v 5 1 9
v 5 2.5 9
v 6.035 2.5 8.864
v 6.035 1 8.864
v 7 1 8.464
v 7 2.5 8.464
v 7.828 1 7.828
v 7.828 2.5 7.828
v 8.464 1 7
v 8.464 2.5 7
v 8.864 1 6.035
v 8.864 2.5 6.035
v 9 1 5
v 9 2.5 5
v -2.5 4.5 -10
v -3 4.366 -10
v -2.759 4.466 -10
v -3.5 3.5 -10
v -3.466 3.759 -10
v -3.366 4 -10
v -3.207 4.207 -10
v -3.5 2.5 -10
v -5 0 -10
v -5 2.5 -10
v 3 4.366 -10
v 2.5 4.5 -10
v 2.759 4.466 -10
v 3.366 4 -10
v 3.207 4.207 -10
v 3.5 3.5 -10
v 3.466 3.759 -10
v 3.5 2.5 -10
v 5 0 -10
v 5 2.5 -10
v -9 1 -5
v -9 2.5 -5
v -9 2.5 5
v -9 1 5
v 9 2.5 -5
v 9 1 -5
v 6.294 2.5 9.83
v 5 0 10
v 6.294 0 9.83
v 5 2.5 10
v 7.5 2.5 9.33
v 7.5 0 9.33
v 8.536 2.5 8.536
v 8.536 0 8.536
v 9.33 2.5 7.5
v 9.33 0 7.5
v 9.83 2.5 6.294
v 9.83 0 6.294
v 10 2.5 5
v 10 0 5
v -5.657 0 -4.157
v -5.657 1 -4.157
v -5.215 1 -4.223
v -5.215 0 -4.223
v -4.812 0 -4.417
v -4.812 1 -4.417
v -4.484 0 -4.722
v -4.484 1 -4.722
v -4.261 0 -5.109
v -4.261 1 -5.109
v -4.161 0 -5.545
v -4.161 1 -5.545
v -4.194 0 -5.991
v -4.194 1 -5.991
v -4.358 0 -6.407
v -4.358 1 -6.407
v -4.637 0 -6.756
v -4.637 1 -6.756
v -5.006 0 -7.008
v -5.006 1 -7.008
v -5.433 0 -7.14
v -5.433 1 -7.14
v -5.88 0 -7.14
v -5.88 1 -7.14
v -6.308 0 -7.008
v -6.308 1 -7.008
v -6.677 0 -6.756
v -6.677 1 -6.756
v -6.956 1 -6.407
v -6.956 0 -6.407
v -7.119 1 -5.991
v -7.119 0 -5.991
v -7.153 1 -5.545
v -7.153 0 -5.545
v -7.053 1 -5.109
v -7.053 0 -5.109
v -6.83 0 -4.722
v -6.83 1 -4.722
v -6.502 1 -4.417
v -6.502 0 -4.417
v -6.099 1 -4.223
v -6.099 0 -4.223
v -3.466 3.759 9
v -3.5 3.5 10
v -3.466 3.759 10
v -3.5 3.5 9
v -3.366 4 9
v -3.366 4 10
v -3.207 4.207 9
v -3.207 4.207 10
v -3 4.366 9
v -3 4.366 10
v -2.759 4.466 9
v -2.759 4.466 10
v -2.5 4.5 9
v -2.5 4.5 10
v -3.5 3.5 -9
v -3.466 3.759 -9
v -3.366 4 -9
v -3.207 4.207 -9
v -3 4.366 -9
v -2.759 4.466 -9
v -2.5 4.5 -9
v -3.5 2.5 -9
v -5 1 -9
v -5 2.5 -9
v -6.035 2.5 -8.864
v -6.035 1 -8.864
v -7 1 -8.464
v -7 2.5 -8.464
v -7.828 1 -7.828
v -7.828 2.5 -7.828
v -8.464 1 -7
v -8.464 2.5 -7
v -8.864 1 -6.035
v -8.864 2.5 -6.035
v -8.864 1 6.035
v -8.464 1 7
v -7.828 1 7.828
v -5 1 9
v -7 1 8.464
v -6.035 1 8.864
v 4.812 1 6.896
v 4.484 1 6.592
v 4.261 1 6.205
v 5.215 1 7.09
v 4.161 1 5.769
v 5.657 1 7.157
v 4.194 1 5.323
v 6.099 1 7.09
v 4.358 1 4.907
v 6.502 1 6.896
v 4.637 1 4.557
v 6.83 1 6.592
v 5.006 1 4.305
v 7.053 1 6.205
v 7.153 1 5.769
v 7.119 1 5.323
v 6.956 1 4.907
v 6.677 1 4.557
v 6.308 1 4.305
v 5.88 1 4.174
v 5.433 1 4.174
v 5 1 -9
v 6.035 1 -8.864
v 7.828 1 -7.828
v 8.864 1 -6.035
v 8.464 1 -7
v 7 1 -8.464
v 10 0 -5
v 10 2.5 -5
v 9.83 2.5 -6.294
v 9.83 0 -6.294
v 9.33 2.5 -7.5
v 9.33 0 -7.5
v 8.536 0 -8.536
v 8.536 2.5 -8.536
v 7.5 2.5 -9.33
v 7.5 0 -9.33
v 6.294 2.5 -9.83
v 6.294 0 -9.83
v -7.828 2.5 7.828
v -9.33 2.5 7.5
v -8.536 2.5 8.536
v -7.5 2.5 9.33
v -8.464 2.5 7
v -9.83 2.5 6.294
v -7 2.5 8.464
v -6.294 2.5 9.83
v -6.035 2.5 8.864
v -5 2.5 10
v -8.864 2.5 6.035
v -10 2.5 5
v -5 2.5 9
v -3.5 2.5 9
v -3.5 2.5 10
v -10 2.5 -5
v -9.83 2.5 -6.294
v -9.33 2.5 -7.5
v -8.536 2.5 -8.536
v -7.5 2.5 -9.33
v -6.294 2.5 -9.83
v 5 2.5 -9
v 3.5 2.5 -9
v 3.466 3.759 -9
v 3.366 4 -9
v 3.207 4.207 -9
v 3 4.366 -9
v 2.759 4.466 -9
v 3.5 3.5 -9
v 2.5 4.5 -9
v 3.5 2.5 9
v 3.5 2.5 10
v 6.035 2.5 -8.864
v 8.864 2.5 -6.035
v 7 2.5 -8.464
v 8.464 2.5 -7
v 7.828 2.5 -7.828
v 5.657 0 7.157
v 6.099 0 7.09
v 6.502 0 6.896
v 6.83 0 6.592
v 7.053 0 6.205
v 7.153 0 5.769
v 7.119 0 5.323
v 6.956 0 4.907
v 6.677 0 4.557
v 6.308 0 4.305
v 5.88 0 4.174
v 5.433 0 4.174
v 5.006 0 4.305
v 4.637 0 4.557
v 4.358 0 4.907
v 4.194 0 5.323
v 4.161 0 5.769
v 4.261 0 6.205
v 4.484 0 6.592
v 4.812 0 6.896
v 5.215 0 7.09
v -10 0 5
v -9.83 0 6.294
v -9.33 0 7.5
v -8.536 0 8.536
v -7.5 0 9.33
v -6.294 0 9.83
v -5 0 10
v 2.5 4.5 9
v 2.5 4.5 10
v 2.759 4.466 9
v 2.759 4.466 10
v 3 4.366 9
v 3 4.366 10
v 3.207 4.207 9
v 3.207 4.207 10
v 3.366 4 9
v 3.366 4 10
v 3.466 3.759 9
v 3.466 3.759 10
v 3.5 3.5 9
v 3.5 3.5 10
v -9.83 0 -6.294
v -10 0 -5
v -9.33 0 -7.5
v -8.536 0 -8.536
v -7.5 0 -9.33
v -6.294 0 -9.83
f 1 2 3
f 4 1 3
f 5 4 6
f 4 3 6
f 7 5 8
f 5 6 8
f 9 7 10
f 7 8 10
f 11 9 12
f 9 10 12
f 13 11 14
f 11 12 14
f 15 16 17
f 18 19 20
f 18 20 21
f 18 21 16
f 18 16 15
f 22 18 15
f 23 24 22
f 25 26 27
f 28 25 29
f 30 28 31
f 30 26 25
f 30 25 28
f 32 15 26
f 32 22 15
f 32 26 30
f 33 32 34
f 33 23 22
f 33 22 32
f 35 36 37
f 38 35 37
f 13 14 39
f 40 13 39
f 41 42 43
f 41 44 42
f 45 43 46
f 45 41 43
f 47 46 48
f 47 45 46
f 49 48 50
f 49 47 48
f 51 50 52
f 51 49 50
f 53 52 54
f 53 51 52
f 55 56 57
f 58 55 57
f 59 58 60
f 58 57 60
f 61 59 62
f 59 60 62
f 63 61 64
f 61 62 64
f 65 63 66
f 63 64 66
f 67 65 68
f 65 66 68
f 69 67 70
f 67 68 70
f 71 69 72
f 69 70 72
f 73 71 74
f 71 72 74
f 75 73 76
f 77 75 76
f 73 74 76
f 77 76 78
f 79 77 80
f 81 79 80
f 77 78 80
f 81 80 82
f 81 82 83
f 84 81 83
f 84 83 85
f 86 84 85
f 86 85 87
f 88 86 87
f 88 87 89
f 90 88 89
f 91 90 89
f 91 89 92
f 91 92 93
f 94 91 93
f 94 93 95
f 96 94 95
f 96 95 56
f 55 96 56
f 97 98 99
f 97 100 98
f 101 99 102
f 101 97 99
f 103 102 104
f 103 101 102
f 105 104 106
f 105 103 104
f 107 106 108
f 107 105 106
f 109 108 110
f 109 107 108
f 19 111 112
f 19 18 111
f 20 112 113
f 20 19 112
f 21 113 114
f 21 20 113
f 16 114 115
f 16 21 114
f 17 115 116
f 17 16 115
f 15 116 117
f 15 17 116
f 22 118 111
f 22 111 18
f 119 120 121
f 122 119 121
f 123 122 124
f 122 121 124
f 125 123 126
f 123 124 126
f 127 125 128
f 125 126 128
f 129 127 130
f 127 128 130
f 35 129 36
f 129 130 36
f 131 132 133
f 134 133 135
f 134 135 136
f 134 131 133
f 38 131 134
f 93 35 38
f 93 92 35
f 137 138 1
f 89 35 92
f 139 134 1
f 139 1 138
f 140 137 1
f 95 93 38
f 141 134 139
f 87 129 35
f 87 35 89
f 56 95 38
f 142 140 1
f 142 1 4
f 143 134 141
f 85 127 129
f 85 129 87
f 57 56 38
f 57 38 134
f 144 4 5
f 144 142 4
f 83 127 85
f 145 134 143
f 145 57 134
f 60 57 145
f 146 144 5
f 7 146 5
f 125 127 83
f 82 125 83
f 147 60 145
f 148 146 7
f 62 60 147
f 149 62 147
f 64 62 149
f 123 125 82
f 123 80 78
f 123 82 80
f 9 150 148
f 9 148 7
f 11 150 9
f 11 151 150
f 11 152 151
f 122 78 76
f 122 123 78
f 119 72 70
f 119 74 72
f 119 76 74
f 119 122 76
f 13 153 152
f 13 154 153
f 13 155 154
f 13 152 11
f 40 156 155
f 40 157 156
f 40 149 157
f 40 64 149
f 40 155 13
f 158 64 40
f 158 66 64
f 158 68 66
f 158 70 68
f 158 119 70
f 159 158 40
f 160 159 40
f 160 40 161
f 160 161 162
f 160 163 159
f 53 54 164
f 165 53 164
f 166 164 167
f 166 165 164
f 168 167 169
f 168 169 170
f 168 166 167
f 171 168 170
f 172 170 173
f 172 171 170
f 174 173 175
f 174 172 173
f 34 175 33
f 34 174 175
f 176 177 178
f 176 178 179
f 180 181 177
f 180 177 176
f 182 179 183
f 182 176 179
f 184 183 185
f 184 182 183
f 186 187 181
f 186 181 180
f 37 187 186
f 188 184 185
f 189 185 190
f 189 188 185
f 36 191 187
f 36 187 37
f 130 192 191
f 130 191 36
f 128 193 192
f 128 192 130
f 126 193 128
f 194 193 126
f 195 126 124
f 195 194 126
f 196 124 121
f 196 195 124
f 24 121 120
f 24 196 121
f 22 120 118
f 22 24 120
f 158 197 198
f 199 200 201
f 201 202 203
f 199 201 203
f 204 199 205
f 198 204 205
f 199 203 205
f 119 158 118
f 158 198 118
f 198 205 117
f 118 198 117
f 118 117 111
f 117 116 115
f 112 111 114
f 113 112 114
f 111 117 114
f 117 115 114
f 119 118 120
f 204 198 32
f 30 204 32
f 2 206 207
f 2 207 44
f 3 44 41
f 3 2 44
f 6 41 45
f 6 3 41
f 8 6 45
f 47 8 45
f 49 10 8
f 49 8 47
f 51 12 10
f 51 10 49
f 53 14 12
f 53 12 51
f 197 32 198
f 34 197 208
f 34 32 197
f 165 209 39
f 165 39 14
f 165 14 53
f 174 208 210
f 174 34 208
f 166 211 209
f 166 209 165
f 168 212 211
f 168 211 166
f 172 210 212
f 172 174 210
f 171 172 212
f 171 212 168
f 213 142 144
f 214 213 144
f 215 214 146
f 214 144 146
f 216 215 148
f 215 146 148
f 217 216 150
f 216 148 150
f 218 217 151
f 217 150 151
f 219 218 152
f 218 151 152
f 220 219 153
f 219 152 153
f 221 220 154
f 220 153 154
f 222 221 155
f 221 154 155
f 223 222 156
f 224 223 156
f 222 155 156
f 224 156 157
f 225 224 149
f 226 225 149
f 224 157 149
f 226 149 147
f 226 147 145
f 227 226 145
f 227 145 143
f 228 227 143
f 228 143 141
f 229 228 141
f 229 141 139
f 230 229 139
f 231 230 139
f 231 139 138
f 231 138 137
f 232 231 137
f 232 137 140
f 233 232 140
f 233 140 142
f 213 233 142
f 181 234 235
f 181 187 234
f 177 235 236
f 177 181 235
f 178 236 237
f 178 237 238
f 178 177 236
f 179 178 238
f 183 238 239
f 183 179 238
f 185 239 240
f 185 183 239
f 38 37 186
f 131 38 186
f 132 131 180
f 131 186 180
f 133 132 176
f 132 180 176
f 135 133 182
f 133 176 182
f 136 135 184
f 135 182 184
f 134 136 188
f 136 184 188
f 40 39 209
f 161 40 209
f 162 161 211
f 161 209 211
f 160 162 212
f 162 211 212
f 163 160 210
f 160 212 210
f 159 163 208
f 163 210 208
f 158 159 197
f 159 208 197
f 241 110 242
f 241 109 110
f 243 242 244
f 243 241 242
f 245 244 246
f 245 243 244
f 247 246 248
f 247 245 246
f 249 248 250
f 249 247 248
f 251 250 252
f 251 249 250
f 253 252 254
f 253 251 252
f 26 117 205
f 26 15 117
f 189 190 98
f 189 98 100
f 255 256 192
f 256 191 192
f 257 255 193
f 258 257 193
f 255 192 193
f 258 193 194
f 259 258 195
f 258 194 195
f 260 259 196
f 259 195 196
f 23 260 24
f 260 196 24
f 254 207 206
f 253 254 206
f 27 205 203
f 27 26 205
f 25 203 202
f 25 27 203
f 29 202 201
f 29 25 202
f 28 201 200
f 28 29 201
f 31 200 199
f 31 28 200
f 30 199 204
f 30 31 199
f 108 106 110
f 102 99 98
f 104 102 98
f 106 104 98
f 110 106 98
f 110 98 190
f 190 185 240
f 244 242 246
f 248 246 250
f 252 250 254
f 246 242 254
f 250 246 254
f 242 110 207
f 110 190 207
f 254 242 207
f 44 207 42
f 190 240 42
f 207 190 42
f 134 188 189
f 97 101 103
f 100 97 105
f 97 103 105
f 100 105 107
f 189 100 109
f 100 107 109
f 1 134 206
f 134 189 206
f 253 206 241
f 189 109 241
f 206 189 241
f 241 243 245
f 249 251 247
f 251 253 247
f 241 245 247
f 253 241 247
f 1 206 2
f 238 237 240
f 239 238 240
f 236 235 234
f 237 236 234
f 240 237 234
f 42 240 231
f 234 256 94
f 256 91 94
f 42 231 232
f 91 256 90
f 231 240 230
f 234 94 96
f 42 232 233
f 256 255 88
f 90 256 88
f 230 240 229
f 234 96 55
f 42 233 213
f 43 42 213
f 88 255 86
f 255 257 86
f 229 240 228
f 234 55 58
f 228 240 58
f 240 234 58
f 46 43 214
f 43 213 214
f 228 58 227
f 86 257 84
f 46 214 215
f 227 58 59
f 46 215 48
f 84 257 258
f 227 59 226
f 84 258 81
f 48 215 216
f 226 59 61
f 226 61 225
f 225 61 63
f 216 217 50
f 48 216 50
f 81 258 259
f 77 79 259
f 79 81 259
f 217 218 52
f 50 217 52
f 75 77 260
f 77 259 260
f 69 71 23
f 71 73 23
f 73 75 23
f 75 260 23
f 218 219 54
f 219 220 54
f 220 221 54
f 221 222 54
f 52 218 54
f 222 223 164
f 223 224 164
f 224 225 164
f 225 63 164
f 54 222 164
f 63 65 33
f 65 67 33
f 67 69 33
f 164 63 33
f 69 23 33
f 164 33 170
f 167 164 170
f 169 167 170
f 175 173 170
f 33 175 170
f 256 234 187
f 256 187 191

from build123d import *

# Parameters (mm, degrees)
SKETCH1_W           = 20
SKETCH1_H           = 20
BOSS_EXTRUDE1_DEPTH = 2.5
FILLET1_R           = 5
SKETCH2_R           = 1.5
CUT_EXTRUDE1_DEPTH  = 10
CUT_EXTRUDE2_DEPTH  = 1.5
SKETCH4_W           = 7
SKETCH4_H           = 1
BOSS_EXTRUDE2_DEPTH = 2
FILLET2_R           = 1


with BuildPart() as part:
    # Sketch1 → Boss-Extrude1 (new body)
    with BuildSketch(Plane(origin=(0, 0, 0), x_dir=(1, 0, 0), z_dir=(0, 1, 0))):
        Rectangle(SKETCH1_W, SKETCH1_H)
    extrude(amount=BOSS_EXTRUDE1_DEPTH)

    # Fillet1
    fillet1_edges = [part.edges().sort_by_distance(p)[0] for p in [
        (10, 1.25, 10),
        (-10, 1.25, 10),
        (-10, 1.25, -10),
        (10, 1.25, -10),
    ]]
    fillet(fillet1_edges, radius=FILLET1_R)

    # Sketch2 → Cut-Extrude1 (cut)
    with BuildSketch(Plane(origin=(0, 2.5, 0), x_dir=(1, 0, 0), z_dir=(0, 1, 0))):
        with Locations(Location((5.656854249, -5.656854249, 0), (0, 0, 270))):
            Circle(SKETCH2_R)
        with Locations(Location((-5.656854249, 5.656854249, 0), (0, 0, 270))):
            Circle(SKETCH2_R)
    extrude(amount=-CUT_EXTRUDE1_DEPTH, mode=Mode.SUBTRACT)

    # Sketch3 → Cut-Extrude2 (cut)
    with BuildSketch(Plane(origin=(0, 2.5, 0), x_dir=(1, 0, 0), z_dir=(0, 1, 0))):
        with BuildLine():
            Line((5, 9), (-5, 9))
            ThreePointArc((-5, 9), (-7.828427125, 7.828427125), (-9, 5))
            Line((-9, 5), (-9, -5))
            ThreePointArc((-9, -5), (-7.828427125, -7.828427125), (-5, -9))
            Line((-5, -9), (5, -9))
            ThreePointArc((5, -9), (7.828427125, -7.828427125), (9, -5))
            Line((9, -5), (9, 5))
            ThreePointArc((9, 5), (7.828427125, 7.828427125), (5, 9))
        make_face()
    extrude(amount=-CUT_EXTRUDE2_DEPTH, mode=Mode.SUBTRACT)

    # Sketch4 → Boss-Extrude2 (add)
    with BuildSketch(Plane(origin=(0, 2.5, 0), x_dir=(1, 0, 0), z_dir=(0, 1, 0))):
        with Locations((0, 9.5)):
            Rectangle(SKETCH4_W, SKETCH4_H)
        with Locations((0, -9.5)):
            Rectangle(SKETCH4_W, SKETCH4_H)
    extrude(amount=BOSS_EXTRUDE2_DEPTH)

    # Fillet2
    fillet2_edges = [part.edges().sort_by_distance(p)[0] for p in [
        (-3.5, 4.5, -9.5),
        (3.5, 4.5, -9.5),
        (-3.5, 4.5, 9.5),
        (3.5, 4.5, 9.5),
    ]]
    fillet(fillet2_edges, radius=FILLET2_R)


solid = part.part
